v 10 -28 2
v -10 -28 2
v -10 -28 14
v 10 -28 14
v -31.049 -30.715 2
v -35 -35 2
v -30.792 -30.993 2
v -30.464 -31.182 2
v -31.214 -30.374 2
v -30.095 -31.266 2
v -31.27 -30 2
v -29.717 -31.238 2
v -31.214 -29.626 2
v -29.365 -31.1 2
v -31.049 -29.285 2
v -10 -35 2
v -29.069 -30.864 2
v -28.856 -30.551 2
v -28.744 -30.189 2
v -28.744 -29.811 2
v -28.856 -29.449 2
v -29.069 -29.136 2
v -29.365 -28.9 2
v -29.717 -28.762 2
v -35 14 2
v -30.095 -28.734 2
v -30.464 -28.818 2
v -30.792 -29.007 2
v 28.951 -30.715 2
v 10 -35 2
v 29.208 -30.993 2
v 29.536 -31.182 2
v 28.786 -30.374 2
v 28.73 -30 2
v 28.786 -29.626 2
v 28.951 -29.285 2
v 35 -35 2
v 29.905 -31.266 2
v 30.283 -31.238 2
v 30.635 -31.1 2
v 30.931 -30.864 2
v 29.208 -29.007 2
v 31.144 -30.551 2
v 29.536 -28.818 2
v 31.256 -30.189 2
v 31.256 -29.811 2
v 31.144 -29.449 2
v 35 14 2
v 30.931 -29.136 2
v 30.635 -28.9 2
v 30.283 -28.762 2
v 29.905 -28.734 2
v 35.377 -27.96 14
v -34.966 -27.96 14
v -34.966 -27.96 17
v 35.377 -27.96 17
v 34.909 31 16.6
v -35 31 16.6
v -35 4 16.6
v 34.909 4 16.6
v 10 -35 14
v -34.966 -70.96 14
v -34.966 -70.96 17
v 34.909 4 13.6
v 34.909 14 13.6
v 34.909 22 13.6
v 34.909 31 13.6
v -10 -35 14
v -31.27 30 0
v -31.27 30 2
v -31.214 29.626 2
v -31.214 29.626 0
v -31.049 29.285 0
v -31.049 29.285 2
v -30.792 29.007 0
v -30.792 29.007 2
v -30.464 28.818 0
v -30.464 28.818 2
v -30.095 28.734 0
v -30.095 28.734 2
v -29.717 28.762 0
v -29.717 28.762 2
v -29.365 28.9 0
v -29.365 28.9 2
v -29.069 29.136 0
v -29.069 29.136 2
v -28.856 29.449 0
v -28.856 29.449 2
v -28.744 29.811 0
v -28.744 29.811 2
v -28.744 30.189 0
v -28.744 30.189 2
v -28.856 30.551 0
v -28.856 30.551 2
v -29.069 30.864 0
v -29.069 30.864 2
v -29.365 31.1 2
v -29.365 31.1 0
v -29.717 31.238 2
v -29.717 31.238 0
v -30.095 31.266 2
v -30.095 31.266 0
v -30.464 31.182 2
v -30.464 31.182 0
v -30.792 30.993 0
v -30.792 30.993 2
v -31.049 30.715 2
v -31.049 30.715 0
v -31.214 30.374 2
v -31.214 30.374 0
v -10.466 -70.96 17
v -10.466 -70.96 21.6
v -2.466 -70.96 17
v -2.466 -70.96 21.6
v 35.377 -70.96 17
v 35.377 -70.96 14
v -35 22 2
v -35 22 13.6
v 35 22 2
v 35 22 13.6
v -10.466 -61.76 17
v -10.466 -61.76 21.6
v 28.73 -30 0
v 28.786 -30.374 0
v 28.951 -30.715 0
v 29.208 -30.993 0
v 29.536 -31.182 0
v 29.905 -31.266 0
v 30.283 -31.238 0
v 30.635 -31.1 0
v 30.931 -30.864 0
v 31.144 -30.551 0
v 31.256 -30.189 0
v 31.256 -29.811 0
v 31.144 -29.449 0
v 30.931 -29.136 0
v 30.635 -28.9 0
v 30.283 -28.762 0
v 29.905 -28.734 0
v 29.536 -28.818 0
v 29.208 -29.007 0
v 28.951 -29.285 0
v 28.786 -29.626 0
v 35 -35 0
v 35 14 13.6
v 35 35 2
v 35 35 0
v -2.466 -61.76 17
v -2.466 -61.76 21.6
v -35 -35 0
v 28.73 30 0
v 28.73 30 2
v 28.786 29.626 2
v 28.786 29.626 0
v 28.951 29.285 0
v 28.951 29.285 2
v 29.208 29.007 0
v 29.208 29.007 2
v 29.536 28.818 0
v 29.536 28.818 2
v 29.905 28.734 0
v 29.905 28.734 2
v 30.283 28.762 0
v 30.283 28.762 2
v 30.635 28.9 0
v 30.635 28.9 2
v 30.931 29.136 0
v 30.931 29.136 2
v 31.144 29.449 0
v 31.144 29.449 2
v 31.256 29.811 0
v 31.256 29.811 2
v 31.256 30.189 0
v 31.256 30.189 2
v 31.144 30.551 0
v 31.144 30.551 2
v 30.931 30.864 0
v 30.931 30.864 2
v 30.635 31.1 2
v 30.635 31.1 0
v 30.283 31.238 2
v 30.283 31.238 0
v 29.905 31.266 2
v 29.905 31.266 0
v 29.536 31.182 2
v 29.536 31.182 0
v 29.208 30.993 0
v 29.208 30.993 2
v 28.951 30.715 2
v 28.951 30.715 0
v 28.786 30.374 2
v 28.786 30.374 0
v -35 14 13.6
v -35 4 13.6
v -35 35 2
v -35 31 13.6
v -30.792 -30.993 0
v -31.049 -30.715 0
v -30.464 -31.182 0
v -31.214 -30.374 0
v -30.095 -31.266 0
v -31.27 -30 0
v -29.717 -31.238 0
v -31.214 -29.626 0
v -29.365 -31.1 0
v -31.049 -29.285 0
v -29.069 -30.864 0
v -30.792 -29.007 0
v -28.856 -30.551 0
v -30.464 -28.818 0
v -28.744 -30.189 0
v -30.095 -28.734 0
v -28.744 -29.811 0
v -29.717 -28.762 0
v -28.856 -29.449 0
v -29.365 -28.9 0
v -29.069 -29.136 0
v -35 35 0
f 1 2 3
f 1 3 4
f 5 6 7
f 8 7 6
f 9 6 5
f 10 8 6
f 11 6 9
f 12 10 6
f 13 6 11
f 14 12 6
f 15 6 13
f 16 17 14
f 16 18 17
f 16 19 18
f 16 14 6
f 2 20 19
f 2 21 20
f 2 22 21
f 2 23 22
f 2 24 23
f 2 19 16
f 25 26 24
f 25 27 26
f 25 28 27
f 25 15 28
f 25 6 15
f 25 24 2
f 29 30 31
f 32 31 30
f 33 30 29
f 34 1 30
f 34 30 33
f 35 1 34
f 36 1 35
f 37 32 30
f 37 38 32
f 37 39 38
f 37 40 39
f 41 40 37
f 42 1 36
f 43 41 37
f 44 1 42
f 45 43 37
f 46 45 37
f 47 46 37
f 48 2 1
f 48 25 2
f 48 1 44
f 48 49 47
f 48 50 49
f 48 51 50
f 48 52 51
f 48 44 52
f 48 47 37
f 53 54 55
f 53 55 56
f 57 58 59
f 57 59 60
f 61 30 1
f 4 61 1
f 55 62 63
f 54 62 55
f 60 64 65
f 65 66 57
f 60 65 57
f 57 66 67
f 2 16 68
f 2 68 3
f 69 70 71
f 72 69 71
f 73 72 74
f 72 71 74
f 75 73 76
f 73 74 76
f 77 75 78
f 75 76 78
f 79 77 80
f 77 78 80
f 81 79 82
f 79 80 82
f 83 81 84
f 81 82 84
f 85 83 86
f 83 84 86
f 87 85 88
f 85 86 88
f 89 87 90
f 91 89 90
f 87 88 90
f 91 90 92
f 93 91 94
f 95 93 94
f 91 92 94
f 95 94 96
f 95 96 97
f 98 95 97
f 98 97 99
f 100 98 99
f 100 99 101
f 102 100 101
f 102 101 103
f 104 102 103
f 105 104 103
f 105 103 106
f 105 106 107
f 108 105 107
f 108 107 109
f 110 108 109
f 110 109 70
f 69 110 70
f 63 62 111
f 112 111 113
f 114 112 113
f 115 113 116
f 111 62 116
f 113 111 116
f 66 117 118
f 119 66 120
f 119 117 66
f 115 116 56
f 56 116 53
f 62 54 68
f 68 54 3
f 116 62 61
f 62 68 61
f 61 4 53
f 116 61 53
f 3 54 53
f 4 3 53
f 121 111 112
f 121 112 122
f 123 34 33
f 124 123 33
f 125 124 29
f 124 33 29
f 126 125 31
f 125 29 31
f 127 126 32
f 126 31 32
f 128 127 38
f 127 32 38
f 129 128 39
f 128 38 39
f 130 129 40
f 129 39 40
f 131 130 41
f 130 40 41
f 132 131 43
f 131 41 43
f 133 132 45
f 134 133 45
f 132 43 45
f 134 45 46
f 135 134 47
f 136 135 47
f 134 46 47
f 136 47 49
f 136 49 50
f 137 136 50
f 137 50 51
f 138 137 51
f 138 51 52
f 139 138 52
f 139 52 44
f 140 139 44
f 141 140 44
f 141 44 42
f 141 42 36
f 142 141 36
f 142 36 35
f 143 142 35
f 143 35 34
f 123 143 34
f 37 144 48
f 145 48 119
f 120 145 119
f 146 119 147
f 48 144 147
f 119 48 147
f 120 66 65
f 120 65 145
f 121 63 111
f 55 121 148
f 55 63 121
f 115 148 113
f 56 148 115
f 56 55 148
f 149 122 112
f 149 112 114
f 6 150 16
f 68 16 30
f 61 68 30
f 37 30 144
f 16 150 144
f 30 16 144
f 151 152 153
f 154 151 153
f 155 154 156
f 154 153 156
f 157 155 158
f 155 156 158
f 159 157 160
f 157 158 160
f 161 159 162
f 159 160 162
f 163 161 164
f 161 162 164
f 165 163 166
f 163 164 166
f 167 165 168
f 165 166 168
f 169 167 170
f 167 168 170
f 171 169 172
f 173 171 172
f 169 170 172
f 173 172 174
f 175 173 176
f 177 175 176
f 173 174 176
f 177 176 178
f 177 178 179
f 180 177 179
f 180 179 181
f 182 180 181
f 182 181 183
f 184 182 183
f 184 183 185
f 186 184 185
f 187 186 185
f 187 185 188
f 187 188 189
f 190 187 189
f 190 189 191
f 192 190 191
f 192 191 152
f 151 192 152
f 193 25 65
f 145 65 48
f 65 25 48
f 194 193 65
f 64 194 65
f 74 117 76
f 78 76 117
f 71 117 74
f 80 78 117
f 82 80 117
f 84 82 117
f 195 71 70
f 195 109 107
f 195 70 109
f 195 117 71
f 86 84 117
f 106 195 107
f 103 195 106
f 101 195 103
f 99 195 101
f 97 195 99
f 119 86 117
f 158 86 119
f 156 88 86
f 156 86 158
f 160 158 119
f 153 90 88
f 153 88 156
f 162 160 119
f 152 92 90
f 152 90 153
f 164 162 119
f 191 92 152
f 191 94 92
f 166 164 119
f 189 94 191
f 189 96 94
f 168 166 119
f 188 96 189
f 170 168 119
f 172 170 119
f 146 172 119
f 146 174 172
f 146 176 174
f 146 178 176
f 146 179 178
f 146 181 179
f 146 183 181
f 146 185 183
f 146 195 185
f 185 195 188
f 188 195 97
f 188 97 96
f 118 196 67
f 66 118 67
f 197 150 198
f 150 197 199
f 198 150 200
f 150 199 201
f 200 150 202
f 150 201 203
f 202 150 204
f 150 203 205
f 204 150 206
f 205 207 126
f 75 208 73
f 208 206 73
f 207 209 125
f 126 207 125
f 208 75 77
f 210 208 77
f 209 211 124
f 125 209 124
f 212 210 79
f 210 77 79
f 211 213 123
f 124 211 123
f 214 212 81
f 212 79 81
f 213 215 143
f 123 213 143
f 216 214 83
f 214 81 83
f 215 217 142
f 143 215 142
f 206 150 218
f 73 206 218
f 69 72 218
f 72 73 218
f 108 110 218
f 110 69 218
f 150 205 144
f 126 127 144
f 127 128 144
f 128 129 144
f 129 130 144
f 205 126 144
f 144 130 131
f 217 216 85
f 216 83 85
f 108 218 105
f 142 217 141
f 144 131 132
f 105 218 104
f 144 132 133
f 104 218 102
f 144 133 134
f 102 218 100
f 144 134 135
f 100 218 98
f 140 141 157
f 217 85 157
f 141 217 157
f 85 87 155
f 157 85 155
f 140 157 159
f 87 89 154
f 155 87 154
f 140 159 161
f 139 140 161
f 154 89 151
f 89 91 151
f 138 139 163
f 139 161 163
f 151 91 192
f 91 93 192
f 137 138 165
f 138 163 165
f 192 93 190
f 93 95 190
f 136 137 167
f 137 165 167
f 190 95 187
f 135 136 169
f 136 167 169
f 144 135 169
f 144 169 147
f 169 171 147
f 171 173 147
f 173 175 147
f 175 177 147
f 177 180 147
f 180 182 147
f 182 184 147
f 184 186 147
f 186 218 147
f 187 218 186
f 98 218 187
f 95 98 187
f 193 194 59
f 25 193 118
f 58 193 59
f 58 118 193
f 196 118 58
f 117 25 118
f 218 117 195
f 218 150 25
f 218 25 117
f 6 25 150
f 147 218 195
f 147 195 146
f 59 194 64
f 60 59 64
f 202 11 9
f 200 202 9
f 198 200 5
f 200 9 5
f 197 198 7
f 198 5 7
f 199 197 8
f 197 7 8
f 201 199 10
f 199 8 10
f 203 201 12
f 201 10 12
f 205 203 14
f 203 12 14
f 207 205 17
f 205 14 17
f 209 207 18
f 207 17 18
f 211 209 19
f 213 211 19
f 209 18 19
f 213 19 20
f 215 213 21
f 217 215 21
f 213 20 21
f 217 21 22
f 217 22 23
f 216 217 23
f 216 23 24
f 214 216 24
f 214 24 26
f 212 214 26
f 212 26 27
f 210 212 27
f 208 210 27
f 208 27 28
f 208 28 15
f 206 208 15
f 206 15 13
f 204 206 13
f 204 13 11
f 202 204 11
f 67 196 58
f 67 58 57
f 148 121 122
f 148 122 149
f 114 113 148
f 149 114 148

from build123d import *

# Parameters (mm, degrees)
F0_W      = 70
F0_H      = 70
F1_DEPTH  = 2
F3_D      = 2.54
F4_W      = 70
F4_H      = 8
F5_DEPTH  = 11.6
F6_W      = 69.909066
F6_H      = 27
F7_DEPTH  = 3
F8_W      = 20
F8_H      = 7
F9_DEPTH  = 12
F10_W     = 70.34298
F10_H     = 43
F11_DEPTH = 3
F12_W     = 8
F12_H     = 9.2
F13_DEPTH = 4.6


with BuildPart() as f1:
    # F0 (on Top) → F1 (new body)
    with BuildSketch(Plane.XY):
        Rectangle(F0_W, F0_H)
    extrude(amount=F1_DEPTH)

    # F3 (through all)
    with Locations(Plane(origin=(0, 0, 0), x_dir=(1, 0, 0), z_dir=(0, 0, -1))):
        with Locations((-30, 30), (30, 30), (-30, -30), (30, -30)):
            Hole(F3_D / 2)

    # F4 (on face) → F5 (join)
    with BuildSketch(Plane.XY.offset(2)):
        with Locations((0, 18)):
            Rectangle(F4_W, F4_H)
    extrude(amount=F5_DEPTH)

    # F6 (on face) → F7 (join)
    with BuildSketch(Plane.XY.offset(13.6)):
        with Locations((-0.045467, 17.5)):
            Rectangle(F6_W, F6_H)
    extrude(amount=F7_DEPTH)

    # F8 (on face) → F9 (join)
    with BuildSketch(Plane.XY.offset(2)):
        with Locations((0, -31.5)):
            Rectangle(F8_W, F8_H)
    extrude(amount=F9_DEPTH)

    # F10 (on face) → F11 (join)
    with BuildSketch(Plane.XY.offset(14)):
        with Locations((0.205681, -49.460026)):
            Rectangle(F10_W, F10_H)
    extrude(amount=F11_DEPTH)

    # F12 (on face) → F13 (join)
    with BuildSketch(Plane.XY.offset(17)):
        with Locations((-6.465809, -66.360026)):
            Rectangle(F12_W, F12_H)
    extrude(amount=F13_DEPTH)


solid = f1.part
